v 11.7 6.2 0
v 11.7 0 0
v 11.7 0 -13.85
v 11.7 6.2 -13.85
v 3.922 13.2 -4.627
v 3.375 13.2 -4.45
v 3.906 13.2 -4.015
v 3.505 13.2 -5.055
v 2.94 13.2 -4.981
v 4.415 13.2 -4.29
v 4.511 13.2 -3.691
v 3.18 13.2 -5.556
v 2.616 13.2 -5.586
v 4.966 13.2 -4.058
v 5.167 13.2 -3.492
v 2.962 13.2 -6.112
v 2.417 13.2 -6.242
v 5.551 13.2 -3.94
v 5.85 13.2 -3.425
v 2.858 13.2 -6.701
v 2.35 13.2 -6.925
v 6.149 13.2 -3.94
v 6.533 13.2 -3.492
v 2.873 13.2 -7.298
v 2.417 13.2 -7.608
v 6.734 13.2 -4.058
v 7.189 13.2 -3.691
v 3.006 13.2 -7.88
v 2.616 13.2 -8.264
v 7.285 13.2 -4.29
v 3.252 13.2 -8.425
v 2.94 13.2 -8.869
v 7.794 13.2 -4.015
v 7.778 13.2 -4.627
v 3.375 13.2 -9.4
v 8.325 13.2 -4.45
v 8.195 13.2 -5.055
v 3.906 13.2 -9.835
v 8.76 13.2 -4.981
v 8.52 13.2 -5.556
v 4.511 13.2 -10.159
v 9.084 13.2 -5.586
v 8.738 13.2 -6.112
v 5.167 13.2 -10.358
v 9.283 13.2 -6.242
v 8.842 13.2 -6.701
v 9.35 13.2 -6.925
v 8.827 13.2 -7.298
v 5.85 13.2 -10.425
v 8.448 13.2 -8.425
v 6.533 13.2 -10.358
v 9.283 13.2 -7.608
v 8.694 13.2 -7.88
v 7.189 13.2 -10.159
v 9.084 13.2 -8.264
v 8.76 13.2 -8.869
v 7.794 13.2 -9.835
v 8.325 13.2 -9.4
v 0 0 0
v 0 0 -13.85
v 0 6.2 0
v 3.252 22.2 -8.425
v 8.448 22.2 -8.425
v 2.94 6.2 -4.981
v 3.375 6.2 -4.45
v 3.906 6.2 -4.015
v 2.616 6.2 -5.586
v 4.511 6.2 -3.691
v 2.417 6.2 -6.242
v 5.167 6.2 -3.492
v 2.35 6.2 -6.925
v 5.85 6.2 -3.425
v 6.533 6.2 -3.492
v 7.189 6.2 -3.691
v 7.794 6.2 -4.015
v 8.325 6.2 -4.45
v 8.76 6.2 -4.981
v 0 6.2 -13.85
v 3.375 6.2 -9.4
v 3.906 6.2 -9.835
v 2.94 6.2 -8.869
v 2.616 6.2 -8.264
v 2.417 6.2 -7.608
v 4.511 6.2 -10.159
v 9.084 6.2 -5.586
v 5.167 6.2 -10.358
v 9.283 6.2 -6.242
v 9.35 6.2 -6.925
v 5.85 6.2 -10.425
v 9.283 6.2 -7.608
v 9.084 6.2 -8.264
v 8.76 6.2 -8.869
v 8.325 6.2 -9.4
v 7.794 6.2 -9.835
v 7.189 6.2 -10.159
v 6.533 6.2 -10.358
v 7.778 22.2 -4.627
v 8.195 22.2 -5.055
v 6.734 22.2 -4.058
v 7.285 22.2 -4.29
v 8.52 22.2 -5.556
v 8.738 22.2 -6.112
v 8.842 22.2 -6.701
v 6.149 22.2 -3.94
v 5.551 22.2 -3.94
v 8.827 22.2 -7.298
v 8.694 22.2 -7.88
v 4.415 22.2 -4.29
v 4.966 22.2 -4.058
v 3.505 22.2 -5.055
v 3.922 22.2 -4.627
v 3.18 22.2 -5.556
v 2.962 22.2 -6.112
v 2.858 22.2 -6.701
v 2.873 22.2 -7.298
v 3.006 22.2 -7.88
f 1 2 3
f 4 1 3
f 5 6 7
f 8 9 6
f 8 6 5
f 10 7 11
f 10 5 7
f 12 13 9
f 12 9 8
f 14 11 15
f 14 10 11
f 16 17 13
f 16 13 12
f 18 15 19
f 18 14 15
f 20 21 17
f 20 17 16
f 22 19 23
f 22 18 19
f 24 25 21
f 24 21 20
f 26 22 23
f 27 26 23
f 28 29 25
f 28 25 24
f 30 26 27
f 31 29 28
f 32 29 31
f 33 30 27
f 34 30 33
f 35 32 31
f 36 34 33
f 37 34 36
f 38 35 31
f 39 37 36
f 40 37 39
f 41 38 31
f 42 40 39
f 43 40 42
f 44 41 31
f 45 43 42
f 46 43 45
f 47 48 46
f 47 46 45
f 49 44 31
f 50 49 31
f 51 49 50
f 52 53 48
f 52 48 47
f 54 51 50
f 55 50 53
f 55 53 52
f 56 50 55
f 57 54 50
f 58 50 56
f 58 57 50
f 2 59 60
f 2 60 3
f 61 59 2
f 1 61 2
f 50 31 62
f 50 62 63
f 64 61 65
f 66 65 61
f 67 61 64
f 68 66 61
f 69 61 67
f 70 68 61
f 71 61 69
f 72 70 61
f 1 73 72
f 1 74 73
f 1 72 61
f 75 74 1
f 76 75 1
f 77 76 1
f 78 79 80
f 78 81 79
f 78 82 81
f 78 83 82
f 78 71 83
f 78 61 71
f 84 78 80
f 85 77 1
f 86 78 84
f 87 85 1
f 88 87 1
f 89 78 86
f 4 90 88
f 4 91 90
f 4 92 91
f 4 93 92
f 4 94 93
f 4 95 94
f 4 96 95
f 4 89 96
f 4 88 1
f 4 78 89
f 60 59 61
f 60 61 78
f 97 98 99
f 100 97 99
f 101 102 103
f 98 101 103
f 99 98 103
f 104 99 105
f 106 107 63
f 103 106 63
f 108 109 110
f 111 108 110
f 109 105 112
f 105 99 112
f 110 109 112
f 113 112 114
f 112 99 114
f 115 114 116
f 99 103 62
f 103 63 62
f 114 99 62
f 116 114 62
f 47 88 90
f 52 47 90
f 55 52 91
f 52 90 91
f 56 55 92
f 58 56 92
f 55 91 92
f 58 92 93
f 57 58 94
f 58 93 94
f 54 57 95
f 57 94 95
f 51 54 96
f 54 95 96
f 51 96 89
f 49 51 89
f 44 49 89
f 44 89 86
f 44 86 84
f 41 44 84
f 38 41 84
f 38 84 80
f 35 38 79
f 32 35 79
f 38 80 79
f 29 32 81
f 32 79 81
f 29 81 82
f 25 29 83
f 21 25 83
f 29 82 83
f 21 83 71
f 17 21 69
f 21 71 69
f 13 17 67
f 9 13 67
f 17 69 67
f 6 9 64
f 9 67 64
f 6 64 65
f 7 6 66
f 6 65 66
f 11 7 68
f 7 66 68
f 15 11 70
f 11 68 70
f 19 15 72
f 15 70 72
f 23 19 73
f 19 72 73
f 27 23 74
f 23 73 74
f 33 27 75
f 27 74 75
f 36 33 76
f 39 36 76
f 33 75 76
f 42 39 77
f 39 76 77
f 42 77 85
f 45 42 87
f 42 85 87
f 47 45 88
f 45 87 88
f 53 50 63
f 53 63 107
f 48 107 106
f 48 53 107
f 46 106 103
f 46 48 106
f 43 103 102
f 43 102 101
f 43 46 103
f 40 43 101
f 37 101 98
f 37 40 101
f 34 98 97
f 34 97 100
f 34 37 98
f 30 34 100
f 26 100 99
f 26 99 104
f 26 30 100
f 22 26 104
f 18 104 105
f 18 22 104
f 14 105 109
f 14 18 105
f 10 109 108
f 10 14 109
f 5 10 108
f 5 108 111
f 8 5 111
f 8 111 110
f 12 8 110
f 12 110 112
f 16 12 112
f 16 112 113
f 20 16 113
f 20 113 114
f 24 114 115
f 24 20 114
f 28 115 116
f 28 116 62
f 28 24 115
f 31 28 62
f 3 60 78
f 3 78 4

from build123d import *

# Parameters (mm, degrees)
SKETCH1_W           = 11.7
SKETCH1_H           = 13.85
BOSS_EXTRUDE1_DEPTH = 6.2
SKETCH2_R           = 3.5
BOSS_EXTRUDE2_DEPTH = 7
BOSS_EXTRUDE3_DEPTH = 9


with BuildPart() as part:
    # Sketch1 → Boss-Extrude1 (new body)
    with BuildSketch(Plane(origin=(0, 0, 0), x_dir=(1, 0, 0), z_dir=(0, 1, 0))):
        with Locations((5.85, 6.925)):
            Rectangle(SKETCH1_W, SKETCH1_H)
    extrude(amount=BOSS_EXTRUDE1_DEPTH)

    # Sketch2 → Boss-Extrude2 (add)
    with BuildSketch(Plane(origin=(0, 6.2, 0), x_dir=(1, 0, 0), z_dir=(0, 1, 0))):
        with Locations((5.85, 6.925)):
            Circle(SKETCH2_R)
    extrude(amount=BOSS_EXTRUDE2_DEPTH)

    # Sketch3 → Boss-Extrude3 (add)
    with BuildSketch(Plane(origin=(0, 13.2, 0), x_dir=(1, 0, 0), z_dir=(0, 1, 0))):
        with BuildLine():
            Line((3.251923789, 8.425), (8.448076211, 8.425))
            ThreePointArc((8.448076211, 8.425), (5.85, 3.925), (3.251923789, 8.425))
        make_face()
    extrude(amount=BOSS_EXTRUDE3_DEPTH)


solid = part.part
